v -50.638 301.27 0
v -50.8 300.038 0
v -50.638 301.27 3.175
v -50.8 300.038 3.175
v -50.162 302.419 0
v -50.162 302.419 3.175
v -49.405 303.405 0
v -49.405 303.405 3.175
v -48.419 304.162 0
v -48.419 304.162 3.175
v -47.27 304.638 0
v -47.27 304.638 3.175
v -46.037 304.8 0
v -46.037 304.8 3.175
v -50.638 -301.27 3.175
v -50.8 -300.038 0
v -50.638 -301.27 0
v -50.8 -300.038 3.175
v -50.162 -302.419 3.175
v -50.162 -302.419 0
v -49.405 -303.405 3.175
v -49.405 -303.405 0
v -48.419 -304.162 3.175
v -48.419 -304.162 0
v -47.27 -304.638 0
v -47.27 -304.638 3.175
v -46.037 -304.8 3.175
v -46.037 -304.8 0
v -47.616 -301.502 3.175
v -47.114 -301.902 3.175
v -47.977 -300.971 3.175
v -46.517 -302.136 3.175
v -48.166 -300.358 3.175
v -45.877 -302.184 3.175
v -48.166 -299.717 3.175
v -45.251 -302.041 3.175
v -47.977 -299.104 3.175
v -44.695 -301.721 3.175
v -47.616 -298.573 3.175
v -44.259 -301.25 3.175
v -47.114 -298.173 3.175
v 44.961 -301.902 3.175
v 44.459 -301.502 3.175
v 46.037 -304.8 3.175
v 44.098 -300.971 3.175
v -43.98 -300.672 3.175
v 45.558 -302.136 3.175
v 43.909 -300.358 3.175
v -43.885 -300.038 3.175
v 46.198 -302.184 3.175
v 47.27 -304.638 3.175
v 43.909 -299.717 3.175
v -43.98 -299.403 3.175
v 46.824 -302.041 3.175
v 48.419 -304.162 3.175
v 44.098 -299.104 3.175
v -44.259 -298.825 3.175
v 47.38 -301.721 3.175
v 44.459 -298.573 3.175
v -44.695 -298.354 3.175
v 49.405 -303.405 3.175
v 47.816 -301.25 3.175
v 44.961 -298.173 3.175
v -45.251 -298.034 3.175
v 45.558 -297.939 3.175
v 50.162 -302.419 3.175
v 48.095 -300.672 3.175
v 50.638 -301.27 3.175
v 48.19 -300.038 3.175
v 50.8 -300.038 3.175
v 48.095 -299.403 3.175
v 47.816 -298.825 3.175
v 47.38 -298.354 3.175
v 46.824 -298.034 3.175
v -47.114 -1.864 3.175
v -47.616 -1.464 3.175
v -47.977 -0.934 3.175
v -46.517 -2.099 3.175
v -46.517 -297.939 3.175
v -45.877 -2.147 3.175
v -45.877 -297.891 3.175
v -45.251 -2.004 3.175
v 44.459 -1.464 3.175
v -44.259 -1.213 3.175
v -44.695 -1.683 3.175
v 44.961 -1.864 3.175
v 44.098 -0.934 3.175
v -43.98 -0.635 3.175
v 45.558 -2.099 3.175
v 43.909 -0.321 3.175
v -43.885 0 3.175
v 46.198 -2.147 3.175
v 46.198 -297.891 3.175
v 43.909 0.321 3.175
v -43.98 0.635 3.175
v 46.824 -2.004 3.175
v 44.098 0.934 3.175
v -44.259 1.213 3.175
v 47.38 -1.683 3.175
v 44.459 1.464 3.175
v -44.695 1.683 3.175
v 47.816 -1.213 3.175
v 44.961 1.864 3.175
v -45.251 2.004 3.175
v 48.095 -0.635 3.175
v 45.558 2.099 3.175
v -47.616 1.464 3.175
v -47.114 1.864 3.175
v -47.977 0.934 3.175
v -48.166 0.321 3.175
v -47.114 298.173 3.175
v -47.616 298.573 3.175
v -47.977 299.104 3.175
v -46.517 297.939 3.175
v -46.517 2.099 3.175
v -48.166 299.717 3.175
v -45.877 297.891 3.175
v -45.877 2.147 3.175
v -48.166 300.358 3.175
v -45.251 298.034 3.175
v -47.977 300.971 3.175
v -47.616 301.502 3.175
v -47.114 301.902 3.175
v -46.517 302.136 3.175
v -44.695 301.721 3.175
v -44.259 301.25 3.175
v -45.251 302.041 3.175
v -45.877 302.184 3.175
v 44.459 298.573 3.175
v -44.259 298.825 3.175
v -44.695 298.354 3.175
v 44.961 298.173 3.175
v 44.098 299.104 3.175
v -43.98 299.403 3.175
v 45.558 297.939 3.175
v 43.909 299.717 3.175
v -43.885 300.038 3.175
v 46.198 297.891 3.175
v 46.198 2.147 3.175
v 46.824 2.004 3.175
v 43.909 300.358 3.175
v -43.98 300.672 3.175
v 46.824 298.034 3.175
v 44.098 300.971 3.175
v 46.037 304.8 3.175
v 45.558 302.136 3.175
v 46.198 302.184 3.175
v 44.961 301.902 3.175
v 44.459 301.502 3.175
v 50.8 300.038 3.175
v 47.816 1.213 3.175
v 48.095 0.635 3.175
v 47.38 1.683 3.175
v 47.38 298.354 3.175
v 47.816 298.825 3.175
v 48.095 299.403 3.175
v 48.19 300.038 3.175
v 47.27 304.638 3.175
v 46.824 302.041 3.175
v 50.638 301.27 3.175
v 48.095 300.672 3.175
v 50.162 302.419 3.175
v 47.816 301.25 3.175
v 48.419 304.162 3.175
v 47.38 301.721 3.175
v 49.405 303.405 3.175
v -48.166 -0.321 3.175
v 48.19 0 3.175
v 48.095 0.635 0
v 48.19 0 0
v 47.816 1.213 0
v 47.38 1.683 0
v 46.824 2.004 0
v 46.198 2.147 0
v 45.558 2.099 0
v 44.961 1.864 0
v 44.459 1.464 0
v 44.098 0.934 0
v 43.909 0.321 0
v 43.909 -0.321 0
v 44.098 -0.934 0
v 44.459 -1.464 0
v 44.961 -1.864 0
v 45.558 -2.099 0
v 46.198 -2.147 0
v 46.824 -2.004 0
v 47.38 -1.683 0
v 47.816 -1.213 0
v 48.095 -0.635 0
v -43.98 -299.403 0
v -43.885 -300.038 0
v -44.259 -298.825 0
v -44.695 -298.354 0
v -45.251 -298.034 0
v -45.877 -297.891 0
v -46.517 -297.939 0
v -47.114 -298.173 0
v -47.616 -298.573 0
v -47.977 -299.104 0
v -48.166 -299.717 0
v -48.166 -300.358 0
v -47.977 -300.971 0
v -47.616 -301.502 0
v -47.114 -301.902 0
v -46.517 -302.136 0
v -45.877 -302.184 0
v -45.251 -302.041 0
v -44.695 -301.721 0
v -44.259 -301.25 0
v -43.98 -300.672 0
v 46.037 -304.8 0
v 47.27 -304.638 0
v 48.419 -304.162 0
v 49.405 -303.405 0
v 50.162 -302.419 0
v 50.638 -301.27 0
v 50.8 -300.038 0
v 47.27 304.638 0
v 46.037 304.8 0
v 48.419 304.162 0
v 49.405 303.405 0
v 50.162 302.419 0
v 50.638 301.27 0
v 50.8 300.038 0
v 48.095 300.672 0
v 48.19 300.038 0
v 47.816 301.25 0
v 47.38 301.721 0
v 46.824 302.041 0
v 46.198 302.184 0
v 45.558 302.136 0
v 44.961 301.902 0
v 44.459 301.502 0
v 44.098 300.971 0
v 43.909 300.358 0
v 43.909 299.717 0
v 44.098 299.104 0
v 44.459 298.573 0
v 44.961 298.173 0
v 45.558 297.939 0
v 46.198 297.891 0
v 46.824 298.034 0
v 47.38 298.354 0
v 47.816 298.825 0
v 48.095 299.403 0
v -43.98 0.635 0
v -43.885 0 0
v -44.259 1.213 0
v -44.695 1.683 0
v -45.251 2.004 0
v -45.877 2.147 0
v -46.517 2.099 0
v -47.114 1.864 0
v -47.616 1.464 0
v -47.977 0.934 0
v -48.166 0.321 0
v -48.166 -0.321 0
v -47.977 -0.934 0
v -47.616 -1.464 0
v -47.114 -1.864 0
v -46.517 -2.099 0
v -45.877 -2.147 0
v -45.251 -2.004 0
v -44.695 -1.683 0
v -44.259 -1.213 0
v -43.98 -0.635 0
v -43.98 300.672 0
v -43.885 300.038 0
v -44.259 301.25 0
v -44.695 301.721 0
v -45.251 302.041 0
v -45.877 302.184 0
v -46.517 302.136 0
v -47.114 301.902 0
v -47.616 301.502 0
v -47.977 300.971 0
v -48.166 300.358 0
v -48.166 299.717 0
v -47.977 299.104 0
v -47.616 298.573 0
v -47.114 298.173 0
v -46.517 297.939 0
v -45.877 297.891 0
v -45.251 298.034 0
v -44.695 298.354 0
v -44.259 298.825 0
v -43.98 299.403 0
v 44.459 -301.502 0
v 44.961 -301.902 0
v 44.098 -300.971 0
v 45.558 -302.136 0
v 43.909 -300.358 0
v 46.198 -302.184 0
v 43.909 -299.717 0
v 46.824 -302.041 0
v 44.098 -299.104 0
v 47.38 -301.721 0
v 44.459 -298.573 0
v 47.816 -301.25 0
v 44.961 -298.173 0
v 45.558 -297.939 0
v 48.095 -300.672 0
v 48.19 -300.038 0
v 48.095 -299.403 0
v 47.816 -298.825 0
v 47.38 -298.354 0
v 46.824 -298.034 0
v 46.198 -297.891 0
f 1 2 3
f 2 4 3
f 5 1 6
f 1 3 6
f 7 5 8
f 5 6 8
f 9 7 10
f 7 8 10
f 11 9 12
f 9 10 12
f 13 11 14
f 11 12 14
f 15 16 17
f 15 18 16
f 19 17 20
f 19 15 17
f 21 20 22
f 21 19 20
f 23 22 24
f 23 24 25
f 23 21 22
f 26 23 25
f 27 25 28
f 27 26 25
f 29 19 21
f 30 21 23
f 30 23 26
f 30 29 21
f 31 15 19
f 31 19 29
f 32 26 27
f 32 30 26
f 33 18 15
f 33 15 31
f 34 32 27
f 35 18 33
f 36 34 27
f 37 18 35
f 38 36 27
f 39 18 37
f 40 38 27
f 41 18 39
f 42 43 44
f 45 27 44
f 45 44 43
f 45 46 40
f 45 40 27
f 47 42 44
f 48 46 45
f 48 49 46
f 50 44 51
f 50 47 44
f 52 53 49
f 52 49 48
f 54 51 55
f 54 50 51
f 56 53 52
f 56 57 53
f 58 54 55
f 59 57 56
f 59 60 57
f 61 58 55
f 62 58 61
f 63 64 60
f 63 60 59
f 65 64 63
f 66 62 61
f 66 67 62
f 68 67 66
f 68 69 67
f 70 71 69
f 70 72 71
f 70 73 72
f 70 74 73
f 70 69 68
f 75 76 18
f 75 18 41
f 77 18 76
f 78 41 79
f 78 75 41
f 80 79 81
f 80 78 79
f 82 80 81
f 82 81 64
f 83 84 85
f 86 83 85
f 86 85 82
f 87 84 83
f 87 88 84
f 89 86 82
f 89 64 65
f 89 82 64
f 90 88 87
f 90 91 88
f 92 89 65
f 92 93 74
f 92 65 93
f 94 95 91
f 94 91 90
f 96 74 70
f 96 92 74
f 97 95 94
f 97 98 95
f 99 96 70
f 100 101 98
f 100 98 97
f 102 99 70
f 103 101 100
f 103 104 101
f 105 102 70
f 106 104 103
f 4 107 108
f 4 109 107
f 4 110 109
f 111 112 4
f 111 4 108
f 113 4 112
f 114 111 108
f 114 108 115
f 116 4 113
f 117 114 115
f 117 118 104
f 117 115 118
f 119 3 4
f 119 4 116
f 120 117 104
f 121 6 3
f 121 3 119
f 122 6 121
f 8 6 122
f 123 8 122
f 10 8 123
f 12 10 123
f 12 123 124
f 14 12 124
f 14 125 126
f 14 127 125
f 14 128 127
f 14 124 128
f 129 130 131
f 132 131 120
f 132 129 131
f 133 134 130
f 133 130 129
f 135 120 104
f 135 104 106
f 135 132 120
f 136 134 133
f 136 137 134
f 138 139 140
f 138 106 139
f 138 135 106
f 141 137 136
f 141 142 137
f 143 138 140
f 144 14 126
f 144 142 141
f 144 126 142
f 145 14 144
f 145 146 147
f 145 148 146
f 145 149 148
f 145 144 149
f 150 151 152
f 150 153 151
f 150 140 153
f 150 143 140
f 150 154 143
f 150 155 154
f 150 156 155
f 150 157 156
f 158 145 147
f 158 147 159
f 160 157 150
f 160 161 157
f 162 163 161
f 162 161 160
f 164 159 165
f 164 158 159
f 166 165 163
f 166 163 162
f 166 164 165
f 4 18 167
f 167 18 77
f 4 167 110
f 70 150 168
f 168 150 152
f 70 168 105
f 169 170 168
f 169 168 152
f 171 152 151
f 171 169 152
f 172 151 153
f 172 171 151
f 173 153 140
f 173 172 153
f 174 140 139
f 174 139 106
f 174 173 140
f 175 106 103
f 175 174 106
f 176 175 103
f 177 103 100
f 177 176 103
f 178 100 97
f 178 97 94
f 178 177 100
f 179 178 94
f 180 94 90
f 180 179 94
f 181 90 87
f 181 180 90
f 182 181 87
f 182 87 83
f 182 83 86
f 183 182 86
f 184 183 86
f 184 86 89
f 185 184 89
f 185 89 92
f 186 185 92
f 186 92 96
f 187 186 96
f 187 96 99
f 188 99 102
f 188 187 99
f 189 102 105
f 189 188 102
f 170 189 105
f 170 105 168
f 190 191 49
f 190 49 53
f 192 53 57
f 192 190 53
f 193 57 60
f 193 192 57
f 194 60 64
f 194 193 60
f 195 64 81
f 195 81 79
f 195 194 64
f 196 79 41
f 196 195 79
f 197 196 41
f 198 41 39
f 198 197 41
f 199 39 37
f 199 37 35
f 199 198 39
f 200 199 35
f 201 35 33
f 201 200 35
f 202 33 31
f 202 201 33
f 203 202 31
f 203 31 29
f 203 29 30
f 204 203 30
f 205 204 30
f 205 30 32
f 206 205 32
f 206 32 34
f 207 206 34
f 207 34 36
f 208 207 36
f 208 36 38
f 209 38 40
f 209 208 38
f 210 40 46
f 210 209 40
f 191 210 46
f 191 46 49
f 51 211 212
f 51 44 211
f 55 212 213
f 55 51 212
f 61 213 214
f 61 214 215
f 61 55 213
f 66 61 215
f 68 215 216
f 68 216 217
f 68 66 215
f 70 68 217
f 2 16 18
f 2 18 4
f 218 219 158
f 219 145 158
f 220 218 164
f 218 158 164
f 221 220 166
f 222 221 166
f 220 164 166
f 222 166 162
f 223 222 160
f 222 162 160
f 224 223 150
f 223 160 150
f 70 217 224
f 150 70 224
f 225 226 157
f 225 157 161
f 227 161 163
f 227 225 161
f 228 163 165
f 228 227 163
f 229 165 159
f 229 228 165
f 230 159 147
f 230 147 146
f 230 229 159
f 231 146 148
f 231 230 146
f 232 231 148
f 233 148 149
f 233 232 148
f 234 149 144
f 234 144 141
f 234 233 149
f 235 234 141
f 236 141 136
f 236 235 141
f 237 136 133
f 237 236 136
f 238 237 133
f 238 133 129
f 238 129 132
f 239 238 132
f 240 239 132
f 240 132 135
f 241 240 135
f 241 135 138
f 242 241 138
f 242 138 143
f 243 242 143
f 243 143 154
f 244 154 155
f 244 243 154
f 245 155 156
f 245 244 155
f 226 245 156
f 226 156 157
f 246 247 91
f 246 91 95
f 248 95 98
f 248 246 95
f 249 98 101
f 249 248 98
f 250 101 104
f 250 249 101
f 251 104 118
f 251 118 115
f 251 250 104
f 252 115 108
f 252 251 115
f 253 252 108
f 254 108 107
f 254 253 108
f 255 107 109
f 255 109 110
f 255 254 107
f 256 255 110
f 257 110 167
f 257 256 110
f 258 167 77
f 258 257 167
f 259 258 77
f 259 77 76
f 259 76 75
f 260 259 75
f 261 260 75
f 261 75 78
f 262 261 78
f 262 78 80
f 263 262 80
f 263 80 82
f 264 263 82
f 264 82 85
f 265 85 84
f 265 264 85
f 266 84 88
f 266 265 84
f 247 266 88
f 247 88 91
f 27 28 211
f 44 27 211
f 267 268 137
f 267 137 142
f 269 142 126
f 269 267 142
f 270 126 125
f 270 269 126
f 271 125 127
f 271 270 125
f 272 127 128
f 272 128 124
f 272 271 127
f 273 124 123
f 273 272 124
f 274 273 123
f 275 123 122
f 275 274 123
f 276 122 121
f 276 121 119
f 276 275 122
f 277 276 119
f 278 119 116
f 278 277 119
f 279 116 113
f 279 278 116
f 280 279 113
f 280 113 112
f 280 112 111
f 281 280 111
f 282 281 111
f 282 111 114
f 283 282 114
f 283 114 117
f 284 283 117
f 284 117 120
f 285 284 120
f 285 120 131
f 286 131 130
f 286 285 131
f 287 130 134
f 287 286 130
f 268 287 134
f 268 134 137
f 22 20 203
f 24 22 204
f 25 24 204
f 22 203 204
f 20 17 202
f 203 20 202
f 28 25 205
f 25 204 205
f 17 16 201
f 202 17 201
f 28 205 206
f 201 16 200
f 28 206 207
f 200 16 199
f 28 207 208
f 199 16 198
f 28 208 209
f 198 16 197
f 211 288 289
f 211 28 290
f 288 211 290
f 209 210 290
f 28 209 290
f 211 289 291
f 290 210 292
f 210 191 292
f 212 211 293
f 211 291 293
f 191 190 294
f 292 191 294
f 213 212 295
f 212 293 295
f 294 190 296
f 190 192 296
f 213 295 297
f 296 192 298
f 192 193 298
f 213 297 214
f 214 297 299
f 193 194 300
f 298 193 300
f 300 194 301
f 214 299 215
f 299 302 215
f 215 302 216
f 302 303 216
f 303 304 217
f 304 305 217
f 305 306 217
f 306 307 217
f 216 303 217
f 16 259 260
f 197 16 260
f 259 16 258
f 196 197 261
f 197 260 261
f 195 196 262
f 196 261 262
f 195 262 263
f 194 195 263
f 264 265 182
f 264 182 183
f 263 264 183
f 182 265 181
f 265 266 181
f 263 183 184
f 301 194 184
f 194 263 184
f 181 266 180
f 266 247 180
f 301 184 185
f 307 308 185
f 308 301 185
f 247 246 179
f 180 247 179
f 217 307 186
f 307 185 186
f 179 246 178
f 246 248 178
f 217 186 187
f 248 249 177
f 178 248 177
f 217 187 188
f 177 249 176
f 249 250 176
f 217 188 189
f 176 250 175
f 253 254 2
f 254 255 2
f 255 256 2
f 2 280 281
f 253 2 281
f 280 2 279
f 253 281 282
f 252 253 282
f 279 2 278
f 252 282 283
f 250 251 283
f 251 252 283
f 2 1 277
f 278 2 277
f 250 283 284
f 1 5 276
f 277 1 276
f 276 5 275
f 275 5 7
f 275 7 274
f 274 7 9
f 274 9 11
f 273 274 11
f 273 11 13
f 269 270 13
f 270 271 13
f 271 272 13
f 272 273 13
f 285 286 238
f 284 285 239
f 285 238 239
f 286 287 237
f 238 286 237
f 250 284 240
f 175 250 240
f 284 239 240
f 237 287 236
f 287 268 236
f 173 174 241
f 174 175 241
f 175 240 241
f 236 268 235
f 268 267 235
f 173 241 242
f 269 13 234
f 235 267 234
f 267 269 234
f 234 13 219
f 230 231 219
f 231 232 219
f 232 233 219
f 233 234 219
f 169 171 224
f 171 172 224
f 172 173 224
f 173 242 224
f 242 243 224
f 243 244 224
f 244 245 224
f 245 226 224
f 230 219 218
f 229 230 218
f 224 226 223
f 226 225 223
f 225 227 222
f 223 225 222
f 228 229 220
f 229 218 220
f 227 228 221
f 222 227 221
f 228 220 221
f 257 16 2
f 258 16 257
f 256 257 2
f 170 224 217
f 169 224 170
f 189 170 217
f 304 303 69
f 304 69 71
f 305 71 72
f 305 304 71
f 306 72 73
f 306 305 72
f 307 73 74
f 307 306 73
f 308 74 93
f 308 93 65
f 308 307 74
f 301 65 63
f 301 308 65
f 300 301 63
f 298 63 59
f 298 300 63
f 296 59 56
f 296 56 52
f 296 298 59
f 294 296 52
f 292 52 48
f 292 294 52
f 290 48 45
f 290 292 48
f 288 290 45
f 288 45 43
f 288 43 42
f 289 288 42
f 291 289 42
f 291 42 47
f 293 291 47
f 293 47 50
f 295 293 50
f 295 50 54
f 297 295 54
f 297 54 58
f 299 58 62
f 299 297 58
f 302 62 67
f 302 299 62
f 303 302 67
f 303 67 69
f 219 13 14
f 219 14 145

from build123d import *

# Parameters (mm, degrees)
F0_W     = 101.6
F0_H     = 609.6
F0_R     = 2.15265
F1_DEPTH = 3.175
F2_R     = 4.7625


with BuildPart() as f1:
    # F0 (on Top) → F1 (new body)
    with BuildSketch(Plane.XY):
        Rectangle(F0_W, F0_H)
        with Locations((-46.0375, -300.0375)):
            Circle(F0_R, mode=Mode.SUBTRACT)
        with Locations((46.0375, -300.0375)):
            Circle(F0_R, mode=Mode.SUBTRACT)
        with Locations((-46.0375, 0)):
            Circle(F0_R, mode=Mode.SUBTRACT)
        with Locations((-46.0375, 300.0375)):
            Circle(F0_R, mode=Mode.SUBTRACT)
        with Locations((46.0375, 0)):
            Circle(F0_R, mode=Mode.SUBTRACT)
        with Locations((46.0375, 300.0375)):
            Circle(F0_R, mode=Mode.SUBTRACT)
    extrude(amount=F1_DEPTH)

    # F2
    f2_edges = [f1.edges().sort_by_distance(p)[0] for p in [
        (-50.8, 304.8, 1.5875),
        (50.8, 304.8, 1.5875),
        (50.8, -304.8, 1.5875),
        (-50.8, -304.8, 1.5875),
    ]]
    fillet(f2_edges, radius=F2_R)


solid = f1.part
